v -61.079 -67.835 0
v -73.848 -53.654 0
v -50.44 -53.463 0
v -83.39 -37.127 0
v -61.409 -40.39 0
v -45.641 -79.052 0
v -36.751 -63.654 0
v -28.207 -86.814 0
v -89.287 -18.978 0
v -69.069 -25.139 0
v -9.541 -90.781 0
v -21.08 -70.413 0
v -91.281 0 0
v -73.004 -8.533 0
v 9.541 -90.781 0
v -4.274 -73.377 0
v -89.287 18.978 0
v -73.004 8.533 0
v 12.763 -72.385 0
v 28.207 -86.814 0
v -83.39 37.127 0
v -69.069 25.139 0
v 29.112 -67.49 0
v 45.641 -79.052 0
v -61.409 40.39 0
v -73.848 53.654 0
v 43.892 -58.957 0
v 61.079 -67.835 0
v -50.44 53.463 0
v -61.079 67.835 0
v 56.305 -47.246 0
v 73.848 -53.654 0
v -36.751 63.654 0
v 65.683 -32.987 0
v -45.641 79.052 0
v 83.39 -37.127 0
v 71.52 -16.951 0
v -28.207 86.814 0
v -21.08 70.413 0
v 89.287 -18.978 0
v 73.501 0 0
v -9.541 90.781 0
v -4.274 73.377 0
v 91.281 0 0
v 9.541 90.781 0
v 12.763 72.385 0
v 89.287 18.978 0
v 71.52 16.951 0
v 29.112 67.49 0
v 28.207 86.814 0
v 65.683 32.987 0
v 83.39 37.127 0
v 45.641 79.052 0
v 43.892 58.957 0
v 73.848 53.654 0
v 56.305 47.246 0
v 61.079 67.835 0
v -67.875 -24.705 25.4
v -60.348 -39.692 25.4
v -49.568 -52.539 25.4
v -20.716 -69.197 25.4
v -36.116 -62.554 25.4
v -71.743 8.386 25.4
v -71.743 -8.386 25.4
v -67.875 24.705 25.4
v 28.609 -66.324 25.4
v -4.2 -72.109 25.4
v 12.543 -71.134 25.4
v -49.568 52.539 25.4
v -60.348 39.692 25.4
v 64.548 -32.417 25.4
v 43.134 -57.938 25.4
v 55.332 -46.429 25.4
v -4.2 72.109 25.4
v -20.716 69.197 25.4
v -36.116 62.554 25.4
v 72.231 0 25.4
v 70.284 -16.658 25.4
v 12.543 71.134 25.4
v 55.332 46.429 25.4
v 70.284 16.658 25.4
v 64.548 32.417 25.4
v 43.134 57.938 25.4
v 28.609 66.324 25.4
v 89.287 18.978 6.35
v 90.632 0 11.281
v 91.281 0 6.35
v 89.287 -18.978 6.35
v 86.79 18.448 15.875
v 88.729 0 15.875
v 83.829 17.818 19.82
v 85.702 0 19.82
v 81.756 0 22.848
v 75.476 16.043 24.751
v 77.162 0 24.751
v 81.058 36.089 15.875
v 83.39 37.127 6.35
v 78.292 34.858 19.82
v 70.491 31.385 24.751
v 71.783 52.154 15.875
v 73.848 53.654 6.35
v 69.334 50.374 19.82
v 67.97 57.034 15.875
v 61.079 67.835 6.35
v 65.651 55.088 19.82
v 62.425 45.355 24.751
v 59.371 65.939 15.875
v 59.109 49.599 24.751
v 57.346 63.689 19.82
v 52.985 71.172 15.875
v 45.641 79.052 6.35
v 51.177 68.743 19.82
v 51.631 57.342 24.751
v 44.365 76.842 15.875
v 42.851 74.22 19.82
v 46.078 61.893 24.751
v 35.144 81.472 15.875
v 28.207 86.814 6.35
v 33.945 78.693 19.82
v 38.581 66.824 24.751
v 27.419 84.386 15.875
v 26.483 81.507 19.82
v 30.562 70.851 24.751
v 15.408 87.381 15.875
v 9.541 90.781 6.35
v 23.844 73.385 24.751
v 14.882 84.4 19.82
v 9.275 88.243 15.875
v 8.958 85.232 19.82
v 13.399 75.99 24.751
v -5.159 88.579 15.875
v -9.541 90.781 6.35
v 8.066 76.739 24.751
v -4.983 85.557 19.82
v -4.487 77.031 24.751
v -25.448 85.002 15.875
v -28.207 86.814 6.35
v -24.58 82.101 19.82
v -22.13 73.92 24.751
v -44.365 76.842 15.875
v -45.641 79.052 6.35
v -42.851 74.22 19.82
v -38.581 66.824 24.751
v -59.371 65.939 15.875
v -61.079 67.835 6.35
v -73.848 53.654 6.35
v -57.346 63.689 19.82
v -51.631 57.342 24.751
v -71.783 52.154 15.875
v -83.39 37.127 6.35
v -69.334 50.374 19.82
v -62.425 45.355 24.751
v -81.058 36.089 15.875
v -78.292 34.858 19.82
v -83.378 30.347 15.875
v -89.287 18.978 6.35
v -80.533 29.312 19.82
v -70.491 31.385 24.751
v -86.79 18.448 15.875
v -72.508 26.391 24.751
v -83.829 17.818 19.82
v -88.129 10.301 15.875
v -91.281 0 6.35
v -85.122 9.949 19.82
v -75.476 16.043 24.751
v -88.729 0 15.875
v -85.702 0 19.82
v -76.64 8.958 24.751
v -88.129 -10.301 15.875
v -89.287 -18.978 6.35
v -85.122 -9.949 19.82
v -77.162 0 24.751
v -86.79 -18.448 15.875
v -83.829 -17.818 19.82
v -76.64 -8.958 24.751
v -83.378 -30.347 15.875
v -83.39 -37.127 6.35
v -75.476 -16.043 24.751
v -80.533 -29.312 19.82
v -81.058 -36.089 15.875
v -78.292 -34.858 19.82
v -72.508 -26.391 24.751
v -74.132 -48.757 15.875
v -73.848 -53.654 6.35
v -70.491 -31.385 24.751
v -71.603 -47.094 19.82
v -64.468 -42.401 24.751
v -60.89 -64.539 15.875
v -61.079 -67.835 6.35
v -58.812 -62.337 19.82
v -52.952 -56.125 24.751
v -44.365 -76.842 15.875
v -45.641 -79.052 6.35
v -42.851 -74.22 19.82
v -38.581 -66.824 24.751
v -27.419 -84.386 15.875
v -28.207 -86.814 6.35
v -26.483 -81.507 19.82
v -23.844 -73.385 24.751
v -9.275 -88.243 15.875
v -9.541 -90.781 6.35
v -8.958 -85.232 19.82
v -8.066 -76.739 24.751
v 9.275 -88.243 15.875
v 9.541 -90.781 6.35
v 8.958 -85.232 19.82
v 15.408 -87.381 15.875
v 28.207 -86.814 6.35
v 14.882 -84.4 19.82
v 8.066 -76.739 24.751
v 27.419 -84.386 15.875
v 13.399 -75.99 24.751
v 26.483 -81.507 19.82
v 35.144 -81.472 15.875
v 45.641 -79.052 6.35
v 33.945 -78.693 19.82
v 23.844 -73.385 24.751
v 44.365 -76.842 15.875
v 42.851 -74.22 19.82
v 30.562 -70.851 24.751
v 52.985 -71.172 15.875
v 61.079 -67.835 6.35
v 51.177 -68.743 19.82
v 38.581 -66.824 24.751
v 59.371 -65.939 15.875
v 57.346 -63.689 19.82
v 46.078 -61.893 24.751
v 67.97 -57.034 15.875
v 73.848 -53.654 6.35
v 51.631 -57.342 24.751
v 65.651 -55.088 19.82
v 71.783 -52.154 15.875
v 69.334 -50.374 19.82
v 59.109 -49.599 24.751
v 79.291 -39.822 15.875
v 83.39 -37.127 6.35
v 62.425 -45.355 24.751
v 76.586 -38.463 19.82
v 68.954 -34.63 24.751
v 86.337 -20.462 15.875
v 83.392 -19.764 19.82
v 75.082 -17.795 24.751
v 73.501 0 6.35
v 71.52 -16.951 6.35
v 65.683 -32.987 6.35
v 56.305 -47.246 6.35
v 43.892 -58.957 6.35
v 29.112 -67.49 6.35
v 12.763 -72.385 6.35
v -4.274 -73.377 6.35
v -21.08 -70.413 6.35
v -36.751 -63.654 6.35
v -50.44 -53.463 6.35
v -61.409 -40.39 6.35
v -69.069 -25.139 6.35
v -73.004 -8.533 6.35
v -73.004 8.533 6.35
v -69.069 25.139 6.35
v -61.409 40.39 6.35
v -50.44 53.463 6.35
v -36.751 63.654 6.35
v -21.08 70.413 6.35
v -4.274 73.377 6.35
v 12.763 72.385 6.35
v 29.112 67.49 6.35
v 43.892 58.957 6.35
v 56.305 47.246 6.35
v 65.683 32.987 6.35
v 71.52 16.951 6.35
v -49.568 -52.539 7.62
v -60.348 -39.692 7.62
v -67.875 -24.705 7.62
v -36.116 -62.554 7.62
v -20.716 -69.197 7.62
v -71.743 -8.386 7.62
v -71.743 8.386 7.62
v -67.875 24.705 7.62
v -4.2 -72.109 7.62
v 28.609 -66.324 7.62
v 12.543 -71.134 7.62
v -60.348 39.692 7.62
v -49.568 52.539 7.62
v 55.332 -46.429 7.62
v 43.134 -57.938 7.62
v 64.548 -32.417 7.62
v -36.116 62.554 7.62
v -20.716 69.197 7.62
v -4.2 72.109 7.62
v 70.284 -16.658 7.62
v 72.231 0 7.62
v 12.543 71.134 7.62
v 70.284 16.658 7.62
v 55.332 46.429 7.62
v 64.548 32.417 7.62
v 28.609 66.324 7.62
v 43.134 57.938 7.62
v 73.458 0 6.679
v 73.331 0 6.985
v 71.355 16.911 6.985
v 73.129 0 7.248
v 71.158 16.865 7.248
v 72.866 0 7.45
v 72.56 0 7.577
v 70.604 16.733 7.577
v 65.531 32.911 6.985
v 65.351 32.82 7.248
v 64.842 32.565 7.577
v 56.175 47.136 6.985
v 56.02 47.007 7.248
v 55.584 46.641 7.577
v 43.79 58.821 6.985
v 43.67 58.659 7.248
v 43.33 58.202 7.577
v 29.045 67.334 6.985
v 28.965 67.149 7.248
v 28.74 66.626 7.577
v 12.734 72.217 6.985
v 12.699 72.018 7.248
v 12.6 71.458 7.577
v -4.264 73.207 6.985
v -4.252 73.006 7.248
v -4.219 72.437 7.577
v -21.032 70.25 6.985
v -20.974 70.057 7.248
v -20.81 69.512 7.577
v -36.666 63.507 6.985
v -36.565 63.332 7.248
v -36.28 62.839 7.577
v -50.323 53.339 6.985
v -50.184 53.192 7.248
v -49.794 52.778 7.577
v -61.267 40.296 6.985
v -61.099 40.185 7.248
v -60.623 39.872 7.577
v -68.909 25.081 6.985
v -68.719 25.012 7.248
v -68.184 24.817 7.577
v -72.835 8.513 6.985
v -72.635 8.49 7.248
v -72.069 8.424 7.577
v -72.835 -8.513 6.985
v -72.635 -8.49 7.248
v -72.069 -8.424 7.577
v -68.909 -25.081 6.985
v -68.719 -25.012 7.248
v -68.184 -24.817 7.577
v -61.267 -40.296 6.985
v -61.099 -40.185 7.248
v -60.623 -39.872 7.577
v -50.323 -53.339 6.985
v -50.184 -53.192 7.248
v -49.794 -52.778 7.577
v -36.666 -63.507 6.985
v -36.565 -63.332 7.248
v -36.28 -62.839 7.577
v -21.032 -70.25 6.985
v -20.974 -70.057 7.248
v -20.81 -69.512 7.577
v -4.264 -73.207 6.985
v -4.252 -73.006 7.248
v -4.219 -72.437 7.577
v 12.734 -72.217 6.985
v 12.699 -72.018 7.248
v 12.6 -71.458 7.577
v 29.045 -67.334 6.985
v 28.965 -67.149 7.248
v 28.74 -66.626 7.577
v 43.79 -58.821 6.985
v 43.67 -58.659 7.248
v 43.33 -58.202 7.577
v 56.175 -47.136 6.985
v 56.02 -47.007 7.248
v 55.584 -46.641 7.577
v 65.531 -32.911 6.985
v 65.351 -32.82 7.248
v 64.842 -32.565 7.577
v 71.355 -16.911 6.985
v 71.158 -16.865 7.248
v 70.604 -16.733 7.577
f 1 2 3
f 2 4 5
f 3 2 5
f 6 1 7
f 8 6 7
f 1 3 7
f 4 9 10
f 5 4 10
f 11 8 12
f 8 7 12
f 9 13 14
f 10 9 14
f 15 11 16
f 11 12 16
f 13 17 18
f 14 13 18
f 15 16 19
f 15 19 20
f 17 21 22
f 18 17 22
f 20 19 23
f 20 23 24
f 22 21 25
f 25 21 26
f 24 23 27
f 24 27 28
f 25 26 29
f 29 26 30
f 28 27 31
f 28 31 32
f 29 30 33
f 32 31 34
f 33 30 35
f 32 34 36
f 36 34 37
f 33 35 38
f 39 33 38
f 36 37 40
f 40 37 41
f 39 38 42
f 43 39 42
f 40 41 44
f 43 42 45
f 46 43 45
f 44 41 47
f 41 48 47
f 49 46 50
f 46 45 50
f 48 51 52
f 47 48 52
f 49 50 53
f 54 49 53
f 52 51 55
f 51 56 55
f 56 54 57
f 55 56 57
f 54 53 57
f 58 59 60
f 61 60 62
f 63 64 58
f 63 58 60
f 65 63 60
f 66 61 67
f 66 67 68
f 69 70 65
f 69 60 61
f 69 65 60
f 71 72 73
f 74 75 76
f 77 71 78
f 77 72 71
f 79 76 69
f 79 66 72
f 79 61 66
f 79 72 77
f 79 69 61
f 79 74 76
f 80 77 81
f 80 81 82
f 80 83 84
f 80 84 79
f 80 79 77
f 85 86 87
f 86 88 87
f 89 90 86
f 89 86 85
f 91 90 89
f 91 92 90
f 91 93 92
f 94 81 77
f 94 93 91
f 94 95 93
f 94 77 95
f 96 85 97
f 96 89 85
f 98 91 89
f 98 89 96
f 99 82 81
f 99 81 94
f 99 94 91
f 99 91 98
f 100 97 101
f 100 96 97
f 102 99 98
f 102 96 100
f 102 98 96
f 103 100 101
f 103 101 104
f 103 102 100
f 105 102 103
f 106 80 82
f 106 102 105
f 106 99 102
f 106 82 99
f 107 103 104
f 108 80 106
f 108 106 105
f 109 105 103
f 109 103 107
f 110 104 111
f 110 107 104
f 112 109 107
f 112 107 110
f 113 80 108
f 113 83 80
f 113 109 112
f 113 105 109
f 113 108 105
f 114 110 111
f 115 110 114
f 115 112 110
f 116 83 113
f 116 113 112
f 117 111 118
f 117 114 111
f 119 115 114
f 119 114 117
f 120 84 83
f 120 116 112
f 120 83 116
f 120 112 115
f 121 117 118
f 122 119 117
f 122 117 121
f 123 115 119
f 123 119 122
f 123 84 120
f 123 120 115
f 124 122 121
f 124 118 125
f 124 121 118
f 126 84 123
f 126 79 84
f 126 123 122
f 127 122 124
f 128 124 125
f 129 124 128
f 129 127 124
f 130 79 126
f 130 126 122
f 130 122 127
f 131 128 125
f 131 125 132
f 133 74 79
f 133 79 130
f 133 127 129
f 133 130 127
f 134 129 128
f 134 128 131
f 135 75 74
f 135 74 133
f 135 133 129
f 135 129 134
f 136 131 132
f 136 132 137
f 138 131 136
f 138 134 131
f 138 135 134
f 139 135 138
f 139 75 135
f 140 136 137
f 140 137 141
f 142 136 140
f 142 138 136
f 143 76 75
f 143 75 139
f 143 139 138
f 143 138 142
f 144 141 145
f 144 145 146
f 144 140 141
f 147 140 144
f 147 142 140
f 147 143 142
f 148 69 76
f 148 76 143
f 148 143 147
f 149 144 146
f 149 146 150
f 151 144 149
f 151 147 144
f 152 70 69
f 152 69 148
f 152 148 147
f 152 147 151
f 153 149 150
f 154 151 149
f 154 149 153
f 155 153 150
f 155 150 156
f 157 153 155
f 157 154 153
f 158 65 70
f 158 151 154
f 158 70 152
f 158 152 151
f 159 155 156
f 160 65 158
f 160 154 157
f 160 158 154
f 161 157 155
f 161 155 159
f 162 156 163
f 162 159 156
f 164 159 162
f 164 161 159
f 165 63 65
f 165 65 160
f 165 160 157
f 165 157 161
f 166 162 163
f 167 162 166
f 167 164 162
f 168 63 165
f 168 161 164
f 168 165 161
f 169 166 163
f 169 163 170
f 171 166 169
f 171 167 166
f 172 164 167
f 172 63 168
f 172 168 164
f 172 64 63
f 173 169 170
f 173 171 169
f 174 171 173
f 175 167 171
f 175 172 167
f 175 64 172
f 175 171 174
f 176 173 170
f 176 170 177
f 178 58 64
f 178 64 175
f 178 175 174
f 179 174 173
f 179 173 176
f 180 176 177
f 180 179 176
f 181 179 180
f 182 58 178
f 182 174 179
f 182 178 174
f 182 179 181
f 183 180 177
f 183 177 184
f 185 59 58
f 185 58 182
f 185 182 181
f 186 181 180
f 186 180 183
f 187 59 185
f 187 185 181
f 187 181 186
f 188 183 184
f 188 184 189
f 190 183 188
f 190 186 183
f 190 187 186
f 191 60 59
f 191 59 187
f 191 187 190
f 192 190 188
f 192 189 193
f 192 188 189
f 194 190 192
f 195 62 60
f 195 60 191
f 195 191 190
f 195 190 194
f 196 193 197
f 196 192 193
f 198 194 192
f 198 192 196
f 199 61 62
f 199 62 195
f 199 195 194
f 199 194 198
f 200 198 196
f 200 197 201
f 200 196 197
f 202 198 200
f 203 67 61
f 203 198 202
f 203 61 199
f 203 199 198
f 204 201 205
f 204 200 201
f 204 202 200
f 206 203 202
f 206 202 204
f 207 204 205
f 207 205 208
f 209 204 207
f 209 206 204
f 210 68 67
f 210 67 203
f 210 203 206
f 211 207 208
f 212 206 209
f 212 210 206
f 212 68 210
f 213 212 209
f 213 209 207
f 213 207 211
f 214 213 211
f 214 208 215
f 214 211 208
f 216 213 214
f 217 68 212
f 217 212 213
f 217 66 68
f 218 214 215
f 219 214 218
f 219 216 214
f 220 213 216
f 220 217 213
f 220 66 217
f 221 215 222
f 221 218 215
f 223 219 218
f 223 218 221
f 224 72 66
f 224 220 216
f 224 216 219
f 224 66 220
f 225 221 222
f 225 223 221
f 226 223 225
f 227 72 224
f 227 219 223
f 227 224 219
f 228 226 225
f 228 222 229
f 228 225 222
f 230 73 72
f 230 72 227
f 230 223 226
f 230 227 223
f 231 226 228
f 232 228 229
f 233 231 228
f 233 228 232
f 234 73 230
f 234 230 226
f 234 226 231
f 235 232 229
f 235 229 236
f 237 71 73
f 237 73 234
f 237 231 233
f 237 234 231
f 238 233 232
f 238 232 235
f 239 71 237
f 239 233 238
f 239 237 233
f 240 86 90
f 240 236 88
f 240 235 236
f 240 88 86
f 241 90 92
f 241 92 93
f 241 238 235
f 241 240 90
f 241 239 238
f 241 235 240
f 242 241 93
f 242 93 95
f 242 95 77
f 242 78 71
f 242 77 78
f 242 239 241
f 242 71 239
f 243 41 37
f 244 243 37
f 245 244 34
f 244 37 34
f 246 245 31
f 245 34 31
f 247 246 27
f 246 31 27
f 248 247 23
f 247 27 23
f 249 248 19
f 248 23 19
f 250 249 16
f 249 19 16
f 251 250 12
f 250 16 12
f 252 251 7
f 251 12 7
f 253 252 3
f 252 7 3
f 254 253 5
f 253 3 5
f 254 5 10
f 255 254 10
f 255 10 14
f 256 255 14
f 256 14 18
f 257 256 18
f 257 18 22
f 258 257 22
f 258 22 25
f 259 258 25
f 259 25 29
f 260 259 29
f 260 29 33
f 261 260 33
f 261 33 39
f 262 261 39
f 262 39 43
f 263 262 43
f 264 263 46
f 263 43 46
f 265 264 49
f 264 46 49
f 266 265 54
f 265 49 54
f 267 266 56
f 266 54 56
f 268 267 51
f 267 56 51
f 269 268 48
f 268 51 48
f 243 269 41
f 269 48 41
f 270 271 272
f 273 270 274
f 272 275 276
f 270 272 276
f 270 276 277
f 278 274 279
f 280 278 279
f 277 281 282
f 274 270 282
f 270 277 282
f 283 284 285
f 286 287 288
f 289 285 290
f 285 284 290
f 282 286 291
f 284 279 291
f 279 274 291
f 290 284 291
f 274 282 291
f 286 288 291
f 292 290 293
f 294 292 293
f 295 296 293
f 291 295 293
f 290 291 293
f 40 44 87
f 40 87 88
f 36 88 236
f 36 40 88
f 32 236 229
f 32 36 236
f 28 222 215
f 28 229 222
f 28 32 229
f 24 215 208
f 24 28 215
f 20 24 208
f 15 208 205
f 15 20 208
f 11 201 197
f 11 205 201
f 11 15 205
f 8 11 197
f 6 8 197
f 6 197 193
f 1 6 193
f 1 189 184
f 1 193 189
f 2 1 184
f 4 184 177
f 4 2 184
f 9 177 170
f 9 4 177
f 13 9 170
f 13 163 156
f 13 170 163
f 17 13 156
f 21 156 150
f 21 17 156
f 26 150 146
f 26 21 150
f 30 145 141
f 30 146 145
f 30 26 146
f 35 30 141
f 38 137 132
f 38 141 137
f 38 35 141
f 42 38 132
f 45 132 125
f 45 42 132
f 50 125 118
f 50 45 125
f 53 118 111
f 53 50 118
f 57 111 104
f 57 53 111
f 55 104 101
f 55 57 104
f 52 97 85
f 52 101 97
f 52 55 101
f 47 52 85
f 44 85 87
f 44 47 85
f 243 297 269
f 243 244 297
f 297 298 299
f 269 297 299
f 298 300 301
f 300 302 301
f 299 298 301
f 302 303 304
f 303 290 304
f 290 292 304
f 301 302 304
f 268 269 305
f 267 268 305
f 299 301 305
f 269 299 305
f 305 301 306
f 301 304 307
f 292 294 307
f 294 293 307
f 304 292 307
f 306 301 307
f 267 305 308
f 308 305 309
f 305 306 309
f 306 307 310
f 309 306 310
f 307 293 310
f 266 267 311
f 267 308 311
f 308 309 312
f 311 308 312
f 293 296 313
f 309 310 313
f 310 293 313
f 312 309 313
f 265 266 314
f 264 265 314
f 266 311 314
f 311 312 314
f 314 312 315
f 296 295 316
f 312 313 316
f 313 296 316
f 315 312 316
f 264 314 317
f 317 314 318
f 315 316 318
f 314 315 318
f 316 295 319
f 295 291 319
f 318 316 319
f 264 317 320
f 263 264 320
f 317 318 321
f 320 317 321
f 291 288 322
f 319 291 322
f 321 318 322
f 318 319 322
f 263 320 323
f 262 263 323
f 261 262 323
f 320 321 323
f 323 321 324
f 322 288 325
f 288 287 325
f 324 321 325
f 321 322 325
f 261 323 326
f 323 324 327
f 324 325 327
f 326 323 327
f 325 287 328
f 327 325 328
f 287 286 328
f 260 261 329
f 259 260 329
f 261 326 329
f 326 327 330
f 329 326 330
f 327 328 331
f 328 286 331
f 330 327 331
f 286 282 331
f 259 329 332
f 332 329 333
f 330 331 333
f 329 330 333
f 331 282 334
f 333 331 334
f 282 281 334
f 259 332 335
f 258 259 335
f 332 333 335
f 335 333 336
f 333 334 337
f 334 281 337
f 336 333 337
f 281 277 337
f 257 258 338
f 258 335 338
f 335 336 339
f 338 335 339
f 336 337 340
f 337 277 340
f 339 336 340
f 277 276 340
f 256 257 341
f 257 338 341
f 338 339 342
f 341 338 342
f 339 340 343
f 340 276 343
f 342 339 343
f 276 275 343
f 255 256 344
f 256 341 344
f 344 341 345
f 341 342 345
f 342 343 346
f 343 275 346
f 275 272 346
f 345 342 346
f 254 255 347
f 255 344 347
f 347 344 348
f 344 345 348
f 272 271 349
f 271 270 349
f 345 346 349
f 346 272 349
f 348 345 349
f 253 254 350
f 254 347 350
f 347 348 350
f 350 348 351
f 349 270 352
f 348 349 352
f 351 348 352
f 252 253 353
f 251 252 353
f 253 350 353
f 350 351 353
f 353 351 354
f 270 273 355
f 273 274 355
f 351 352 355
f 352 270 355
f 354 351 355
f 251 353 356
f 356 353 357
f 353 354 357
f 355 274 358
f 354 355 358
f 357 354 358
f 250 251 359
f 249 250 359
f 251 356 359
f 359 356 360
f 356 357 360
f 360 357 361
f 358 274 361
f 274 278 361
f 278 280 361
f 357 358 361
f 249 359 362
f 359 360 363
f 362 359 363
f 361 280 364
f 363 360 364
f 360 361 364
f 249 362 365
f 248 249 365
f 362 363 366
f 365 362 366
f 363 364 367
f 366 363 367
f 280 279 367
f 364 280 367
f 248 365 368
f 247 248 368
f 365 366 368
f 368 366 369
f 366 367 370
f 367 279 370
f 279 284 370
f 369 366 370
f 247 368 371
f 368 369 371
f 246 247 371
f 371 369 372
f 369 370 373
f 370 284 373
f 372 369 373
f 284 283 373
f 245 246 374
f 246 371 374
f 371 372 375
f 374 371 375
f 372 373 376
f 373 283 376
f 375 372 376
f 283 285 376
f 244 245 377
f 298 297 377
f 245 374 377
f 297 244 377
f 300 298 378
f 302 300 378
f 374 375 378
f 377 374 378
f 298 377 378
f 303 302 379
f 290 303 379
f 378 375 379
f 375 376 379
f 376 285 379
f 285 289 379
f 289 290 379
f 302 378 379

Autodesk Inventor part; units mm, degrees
ref_plane "YZ Plane" through (0, 0, 0) normal (1, 0, 0) x (0, 1, 0)
ref_plane "XZ Plane" through (0, 0, 0) normal (0, 1, 0) x (-1, 0, 0)
ref_plane "XY Plane" through (0, 0, 0) normal (0, 0, 1) x (1, 0, 0)
sketch "Sketch1" plane through (0, 0, 0) normal (0, 0, 1) x (1, 0, 0)
  circle A0 centre (0, 0) radius 91.2813
  dimension "d0" = 182.5625
extrude "Extrusion1" add sketch "Sketch1" along normal blind 25.4
fillet "Fillet1" radius 19.05 1 edges at (-91.2813, 0, 25.4)
shell "Shell1" thickness 17.78 removed faces 1 at (21.5393, 24.1816, 0)
properties part number "speakerGrill"
